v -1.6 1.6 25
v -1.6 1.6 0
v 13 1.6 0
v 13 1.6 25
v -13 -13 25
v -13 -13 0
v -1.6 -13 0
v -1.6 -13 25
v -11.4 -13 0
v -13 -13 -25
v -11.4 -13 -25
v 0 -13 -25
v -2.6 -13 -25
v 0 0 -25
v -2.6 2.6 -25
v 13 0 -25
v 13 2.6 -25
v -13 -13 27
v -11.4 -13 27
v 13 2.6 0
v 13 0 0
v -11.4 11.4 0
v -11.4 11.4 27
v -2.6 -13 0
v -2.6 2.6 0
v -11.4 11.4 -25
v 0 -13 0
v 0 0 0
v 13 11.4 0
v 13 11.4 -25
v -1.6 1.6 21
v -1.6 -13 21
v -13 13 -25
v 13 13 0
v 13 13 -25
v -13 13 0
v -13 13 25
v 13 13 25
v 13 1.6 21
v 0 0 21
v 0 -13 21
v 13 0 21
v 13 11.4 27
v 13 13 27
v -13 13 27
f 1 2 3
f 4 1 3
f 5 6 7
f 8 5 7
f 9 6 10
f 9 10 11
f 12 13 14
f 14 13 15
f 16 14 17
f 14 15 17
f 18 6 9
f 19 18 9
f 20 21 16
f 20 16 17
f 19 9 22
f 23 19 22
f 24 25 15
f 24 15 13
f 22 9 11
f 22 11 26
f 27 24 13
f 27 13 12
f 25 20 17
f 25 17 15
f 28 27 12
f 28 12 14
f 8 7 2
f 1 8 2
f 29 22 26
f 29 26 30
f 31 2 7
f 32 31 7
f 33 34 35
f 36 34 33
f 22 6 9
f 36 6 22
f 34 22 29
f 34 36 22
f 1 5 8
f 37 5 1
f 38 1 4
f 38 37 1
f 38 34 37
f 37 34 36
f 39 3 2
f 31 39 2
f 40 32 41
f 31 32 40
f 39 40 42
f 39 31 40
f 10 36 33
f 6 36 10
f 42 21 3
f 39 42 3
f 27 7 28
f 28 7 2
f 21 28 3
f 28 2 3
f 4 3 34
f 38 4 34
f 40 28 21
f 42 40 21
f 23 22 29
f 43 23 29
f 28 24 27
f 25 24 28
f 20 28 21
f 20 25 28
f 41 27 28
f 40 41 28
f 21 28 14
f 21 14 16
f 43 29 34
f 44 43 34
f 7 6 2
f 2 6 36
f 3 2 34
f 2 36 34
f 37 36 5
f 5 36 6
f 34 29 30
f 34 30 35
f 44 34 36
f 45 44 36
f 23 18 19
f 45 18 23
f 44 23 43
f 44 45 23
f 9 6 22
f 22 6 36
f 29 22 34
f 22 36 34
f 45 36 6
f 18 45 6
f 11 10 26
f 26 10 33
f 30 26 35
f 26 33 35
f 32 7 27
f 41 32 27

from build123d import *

# Parameters (mm, degrees)
F1_DEPTH = 25
F2_DEPTH = 21
F3_DEPTH = 27
F4_DEPTH = 25


with BuildPart() as f1:
    # F0 (on Top) → F1 (new body)
    with BuildSketch(Plane.XY):
        Polygon((-13, -13), (-11.4, -13), (-11.4, 0), (-11.4, 11.4), (0, 11.4), (13, 11.4), (13, 13), (0, 13), (-13, 13), (-13, 0), align=None)
        Polygon((-2.6, -13), (-1.6, -13), (-1.6, 1.6), (13, 1.6), (13, 2.6), (-2.6, 2.6), align=None)
        Polygon((-1.6, -13), (0, -13), (0, 0), (13, 0), (13, 1.6), (-1.6, 1.6), align=None)
    extrude(amount=-F1_DEPTH)


with BuildPart() as f2:
    # F0 (on Top) → F2 (new body)
    with BuildSketch(Plane.XY):
        Polygon((-1.6, -13), (0, -13), (0, 0), (13, 0), (13, 1.6), (-1.6, 1.6), align=None)
    extrude(amount=F2_DEPTH)


with BuildPart() as f3:
    # F0 (on Top) → F3 (new body)
    with BuildSketch(Plane.XY):
        Polygon((-13, -13), (-11.4, -13), (-11.4, 0), (-11.4, 11.4), (0, 11.4), (13, 11.4), (13, 13), (0, 13), (-13, 13), (-13, 0), align=None)
    extrude(amount=F3_DEPTH)


with BuildPart() as f4:
    # F0 (on Top) → F4 (new body)
    with BuildSketch(Plane.XY):
        Polygon((-13, -13), (-11.4, -13), (-11.4, 0), (-11.4, 11.4), (0, 11.4), (13, 11.4), (13, 13), (0, 13), (-13, 13), (-13, 0), align=None)
        Polygon((-11.4, -13), (-10.4, -13), (-10.4, 0), (-10.4, 10.4), (0, 10.4), (13, 10.4), (13, 11.4), (0, 11.4), (-11.4, 11.4), (-11.4, 0), align=None)
        Polygon((-10.4, -13), (-2.6, -13), (-2.6, 2.6), (13, 2.6), (13, 10.4), (0, 10.4), (-10.4, 10.4), (-10.4, 0), align=None)
        Polygon((-2.6, -13), (-1.6, -13), (-1.6, 1.6), (13, 1.6), (13, 2.6), (-2.6, 2.6), align=None)
    extrude(amount=F4_DEPTH)


solid = Compound([f1.part, f2.part, f3.part, f4.part])
